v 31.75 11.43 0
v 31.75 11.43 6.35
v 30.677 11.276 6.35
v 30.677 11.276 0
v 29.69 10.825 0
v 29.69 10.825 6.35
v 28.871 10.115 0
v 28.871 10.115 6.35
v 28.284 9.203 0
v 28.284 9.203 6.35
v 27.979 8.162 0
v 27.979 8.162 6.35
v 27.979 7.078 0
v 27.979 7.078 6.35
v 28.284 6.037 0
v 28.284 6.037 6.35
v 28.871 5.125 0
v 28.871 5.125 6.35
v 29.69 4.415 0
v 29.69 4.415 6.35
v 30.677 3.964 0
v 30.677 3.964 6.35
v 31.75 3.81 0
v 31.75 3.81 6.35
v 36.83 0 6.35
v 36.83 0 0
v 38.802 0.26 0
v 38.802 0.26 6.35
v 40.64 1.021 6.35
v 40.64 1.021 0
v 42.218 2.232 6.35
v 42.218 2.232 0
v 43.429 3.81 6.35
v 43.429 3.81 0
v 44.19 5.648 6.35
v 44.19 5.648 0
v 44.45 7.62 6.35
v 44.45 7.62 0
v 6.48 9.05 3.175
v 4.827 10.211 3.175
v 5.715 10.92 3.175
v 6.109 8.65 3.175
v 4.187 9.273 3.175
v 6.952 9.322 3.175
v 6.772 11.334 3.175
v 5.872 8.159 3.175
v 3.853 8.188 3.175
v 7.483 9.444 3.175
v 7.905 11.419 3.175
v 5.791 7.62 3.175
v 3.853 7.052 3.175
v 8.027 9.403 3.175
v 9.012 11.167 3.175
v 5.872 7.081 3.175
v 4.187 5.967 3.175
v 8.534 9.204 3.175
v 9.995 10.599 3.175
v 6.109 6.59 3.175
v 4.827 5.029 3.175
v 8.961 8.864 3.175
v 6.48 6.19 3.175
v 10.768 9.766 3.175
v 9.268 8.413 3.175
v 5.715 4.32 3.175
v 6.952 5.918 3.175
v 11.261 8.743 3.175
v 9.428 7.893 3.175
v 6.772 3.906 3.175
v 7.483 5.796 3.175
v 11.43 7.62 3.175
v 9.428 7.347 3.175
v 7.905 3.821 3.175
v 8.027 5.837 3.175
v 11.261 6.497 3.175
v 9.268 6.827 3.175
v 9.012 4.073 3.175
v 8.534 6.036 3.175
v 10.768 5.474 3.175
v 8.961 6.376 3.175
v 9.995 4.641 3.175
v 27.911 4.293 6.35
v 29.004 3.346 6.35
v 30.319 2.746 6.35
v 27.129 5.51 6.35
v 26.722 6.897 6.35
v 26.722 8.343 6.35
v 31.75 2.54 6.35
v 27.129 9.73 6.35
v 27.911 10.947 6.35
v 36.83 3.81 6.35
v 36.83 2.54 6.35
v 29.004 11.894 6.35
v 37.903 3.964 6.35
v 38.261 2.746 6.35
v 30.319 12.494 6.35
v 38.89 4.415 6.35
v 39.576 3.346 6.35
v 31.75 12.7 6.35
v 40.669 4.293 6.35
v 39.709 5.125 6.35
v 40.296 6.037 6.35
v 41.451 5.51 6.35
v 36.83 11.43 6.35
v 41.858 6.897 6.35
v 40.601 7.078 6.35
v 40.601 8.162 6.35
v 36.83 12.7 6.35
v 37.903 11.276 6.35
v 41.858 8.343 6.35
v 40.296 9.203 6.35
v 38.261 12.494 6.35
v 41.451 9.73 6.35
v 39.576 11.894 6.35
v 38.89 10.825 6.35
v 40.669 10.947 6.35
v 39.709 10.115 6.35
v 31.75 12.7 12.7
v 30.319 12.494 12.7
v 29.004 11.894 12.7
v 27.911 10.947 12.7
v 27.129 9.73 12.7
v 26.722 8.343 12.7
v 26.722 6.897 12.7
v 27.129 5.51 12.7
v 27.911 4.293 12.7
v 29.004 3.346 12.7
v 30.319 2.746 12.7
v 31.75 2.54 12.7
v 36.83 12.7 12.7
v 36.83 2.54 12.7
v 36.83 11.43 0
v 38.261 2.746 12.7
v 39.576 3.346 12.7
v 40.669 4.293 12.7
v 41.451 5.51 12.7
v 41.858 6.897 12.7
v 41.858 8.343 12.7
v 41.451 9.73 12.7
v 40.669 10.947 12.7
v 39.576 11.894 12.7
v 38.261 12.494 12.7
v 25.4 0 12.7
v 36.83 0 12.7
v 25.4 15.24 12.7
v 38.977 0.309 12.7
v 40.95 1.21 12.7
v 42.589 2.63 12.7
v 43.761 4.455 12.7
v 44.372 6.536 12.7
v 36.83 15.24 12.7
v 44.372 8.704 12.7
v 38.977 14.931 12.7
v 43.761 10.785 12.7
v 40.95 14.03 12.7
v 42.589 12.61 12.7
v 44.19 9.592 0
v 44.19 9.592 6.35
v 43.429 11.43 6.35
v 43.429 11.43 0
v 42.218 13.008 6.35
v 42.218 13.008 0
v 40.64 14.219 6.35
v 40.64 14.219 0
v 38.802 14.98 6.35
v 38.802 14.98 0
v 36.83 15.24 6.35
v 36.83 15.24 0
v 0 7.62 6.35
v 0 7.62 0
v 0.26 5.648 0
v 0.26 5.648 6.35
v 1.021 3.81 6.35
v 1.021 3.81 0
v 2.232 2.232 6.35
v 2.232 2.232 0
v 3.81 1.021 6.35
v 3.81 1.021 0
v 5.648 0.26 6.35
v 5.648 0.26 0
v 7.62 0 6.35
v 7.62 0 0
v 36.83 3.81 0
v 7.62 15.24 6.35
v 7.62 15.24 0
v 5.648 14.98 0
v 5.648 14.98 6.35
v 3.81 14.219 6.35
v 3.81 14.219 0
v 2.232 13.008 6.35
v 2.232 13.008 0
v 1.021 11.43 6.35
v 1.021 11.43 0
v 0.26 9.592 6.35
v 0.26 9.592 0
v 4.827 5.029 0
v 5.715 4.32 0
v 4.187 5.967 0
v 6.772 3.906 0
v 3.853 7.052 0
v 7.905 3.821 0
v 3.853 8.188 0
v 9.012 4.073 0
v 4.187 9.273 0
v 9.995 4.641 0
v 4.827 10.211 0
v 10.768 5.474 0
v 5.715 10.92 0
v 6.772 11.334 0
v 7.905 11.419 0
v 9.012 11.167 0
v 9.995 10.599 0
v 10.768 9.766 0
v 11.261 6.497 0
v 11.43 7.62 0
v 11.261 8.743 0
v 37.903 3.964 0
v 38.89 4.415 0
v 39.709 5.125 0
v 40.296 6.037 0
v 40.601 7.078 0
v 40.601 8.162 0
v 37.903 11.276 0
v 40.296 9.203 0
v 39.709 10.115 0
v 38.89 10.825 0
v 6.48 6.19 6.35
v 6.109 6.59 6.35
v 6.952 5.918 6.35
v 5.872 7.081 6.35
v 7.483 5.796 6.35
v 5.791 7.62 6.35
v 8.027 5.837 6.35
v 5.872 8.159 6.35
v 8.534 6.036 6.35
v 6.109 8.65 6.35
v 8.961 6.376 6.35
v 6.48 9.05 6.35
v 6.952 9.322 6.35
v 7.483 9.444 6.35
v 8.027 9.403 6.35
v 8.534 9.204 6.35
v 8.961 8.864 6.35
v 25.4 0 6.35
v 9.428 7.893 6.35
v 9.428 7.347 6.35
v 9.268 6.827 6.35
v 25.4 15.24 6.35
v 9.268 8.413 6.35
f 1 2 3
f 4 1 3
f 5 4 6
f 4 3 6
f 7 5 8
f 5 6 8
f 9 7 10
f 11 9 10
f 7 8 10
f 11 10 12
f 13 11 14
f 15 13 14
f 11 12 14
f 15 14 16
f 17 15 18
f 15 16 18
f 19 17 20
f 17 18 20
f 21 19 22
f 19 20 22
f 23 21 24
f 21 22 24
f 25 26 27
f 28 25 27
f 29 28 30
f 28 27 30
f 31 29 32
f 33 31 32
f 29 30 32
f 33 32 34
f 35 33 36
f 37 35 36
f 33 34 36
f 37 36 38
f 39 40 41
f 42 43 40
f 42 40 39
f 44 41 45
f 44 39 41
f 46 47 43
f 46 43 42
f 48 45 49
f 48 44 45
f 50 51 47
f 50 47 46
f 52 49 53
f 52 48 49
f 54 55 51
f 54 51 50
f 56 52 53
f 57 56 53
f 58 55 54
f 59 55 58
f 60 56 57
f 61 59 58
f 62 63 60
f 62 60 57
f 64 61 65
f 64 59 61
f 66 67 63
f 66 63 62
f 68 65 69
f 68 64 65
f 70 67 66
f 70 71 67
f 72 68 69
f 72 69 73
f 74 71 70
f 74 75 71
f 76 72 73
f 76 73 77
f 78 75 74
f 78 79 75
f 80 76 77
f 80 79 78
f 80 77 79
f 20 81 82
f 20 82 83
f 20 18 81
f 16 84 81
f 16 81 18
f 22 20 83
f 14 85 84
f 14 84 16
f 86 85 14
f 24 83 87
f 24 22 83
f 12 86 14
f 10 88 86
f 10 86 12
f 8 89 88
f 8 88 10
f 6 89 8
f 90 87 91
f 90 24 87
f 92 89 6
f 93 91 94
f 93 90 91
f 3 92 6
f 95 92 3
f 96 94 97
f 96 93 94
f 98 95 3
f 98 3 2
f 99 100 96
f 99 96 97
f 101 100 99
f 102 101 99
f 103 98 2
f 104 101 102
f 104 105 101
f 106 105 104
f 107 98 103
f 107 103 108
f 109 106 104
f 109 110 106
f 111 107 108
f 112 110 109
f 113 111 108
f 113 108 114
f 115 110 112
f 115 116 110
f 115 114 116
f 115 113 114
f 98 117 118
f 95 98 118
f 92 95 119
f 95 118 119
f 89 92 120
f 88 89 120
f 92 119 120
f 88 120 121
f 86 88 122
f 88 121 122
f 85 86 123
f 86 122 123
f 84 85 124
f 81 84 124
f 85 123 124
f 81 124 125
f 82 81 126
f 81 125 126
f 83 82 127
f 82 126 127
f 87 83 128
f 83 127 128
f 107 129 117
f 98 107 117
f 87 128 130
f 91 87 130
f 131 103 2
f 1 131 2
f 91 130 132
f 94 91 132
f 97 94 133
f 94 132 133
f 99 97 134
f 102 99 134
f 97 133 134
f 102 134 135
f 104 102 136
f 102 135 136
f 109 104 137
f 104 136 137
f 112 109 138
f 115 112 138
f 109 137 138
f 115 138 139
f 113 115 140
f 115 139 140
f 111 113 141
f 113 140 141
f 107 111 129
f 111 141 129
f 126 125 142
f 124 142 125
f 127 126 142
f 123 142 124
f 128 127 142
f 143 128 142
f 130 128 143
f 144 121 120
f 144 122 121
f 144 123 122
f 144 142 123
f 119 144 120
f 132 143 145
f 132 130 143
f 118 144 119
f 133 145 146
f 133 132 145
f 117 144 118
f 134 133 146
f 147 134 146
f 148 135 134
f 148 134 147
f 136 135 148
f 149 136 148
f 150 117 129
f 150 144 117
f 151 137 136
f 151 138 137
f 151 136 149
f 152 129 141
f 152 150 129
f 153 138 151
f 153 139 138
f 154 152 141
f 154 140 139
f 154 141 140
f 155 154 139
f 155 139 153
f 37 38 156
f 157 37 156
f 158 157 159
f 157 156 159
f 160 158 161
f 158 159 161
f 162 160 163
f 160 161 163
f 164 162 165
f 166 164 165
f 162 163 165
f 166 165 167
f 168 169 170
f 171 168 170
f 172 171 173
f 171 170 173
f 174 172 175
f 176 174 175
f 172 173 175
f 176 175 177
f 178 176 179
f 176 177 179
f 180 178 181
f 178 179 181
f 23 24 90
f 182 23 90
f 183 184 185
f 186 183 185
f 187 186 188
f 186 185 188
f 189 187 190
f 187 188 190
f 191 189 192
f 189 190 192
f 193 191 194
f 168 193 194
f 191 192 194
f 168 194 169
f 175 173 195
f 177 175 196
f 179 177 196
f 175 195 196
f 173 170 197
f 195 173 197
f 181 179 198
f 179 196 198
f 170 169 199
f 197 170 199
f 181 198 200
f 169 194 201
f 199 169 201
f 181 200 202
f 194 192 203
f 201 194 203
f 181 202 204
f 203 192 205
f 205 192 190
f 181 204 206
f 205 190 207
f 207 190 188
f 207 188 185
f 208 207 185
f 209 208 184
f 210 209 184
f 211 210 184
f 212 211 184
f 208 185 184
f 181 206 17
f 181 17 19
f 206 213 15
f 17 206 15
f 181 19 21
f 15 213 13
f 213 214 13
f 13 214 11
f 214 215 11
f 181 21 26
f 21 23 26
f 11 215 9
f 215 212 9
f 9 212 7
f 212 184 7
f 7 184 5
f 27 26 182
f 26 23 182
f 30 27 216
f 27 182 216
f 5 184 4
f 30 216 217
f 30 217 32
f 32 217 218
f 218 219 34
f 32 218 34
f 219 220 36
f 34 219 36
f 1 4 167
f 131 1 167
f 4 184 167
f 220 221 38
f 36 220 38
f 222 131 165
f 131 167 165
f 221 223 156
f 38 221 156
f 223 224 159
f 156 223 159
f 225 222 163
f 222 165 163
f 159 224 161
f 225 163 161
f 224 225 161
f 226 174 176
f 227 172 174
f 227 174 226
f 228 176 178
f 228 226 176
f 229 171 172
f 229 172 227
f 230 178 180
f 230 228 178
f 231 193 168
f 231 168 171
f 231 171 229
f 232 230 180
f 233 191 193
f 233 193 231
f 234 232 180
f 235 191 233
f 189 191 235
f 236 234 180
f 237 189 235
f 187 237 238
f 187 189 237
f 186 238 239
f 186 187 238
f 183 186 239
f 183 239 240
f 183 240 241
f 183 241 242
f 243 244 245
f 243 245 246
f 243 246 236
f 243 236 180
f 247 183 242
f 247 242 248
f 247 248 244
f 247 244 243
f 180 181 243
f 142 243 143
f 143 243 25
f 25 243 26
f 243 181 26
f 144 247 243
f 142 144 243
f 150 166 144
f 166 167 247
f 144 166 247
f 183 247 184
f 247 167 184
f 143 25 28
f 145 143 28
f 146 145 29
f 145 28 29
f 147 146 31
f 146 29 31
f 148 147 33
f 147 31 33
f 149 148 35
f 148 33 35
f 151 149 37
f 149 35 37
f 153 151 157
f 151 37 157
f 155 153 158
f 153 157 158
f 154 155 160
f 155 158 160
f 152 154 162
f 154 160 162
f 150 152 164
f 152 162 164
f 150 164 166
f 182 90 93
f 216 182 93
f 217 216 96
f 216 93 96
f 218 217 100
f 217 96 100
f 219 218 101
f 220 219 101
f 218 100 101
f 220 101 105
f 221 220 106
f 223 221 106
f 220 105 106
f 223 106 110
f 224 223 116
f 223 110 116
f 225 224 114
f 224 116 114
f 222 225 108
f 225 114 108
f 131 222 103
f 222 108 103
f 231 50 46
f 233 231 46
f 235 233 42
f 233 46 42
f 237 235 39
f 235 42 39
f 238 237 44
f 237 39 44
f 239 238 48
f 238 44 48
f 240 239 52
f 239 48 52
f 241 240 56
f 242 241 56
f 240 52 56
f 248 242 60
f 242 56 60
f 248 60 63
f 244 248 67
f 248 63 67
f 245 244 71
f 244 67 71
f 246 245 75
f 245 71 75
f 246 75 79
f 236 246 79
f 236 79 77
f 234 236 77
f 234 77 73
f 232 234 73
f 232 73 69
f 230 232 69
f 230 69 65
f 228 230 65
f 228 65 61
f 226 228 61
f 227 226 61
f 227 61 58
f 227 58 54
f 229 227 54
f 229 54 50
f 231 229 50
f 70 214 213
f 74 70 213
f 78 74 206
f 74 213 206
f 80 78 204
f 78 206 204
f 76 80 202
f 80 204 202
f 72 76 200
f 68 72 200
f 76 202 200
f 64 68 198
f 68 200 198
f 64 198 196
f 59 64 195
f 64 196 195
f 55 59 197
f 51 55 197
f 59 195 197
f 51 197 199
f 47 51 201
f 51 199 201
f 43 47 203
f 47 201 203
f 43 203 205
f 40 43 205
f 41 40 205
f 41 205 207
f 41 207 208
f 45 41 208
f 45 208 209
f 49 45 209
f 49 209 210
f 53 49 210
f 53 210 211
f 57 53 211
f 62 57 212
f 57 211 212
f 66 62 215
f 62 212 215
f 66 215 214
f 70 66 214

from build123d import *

# Parameters (mm, degrees)
F1_DEPTH  = 6.35
F3_D      = 3.6576
F5_DEPTH  = 6.35
F7_DEPTH  = 12.701
F9_DEPTH  = 6.35
F10_R     = 3.81
F11_DEPTH = 3.175


with BuildPart() as f1:
    # F0 (on Top) → F1 (new body)
    with BuildSketch(Plane.XY):
        with BuildLine():
            ThreePointArc((0, 7.62), (2.2318463274, 2.2318463274), (7.62, 0))
            Line((7.62, 0), (36.83, 0))
            ThreePointArc((36.83, 0), (42.2181536726, 2.2318463274), (44.45, 7.62))
            ThreePointArc((44.45, 7.62), (42.2181536726, 13.0081536726), (36.83, 15.24))
            Line((36.83, 15.24), (7.62, 15.24))
            ThreePointArc((7.62, 15.24), (2.2318463274, 13.0081536726), (0, 7.62))
        make_face()
    extrude(amount=F1_DEPTH)

    # F3 (through all)
    with Locations(Plane.XY.offset(6.35)):
        with Locations((7.62, 7.62)):
            Hole(F3_D / 2)

    # F4 (on face) → F5 (join)
    with BuildSketch(Plane.XY.offset(6.35)):
        with BuildLine():
            Line((36.83, 15.24), (25.4, 15.24))
            Line((25.4, 15.24), (25.4, 0))
            Line((25.4, 0), (36.83, 0))
            ThreePointArc((36.83, 0), (44.45, 7.62), (36.83, 15.24))
        make_face()
    extrude(amount=F5_DEPTH)

    # F6 (on face) → F7 (cut, through all)
    with BuildSketch(Plane.XY.offset(12.7)):
        with BuildLine():
            ThreePointArc((31.75, 11.43), (27.94, 7.62), (31.75, 3.81))
            Line((31.75, 3.81), (36.83, 3.81))
            ThreePointArc((36.83, 3.81), (40.64, 7.62), (36.83, 11.43))
            Line((36.83, 11.43), (31.75, 11.43))
        make_face()
    extrude(amount=-F7_DEPTH, mode=Mode.SUBTRACT)

    # F8 (on face) → F9 (cut)
    with BuildSketch(Plane.XY.offset(12.7)):
        with BuildLine():
            ThreePointArc((31.75, 12.7), (26.67, 7.62), (31.75, 2.54))
            Line((31.75, 2.54), (36.83, 2.54))
            ThreePointArc((36.83, 2.54), (41.91, 7.62), (36.83, 12.7))
            Line((36.83, 12.7), (31.75, 12.7))
        make_face()
    extrude(amount=-F9_DEPTH, mode=Mode.SUBTRACT)

    # F10 (on face) → F11 (cut)
    with BuildSketch(Plane(origin=(0, 0, 0), x_dir=(1, 0, 0), z_dir=(0, 0, -1))):
        with Locations((7.62, -7.62)):
            Circle(F10_R)
    extrude(amount=-F11_DEPTH, mode=Mode.SUBTRACT)


solid = f1.part
